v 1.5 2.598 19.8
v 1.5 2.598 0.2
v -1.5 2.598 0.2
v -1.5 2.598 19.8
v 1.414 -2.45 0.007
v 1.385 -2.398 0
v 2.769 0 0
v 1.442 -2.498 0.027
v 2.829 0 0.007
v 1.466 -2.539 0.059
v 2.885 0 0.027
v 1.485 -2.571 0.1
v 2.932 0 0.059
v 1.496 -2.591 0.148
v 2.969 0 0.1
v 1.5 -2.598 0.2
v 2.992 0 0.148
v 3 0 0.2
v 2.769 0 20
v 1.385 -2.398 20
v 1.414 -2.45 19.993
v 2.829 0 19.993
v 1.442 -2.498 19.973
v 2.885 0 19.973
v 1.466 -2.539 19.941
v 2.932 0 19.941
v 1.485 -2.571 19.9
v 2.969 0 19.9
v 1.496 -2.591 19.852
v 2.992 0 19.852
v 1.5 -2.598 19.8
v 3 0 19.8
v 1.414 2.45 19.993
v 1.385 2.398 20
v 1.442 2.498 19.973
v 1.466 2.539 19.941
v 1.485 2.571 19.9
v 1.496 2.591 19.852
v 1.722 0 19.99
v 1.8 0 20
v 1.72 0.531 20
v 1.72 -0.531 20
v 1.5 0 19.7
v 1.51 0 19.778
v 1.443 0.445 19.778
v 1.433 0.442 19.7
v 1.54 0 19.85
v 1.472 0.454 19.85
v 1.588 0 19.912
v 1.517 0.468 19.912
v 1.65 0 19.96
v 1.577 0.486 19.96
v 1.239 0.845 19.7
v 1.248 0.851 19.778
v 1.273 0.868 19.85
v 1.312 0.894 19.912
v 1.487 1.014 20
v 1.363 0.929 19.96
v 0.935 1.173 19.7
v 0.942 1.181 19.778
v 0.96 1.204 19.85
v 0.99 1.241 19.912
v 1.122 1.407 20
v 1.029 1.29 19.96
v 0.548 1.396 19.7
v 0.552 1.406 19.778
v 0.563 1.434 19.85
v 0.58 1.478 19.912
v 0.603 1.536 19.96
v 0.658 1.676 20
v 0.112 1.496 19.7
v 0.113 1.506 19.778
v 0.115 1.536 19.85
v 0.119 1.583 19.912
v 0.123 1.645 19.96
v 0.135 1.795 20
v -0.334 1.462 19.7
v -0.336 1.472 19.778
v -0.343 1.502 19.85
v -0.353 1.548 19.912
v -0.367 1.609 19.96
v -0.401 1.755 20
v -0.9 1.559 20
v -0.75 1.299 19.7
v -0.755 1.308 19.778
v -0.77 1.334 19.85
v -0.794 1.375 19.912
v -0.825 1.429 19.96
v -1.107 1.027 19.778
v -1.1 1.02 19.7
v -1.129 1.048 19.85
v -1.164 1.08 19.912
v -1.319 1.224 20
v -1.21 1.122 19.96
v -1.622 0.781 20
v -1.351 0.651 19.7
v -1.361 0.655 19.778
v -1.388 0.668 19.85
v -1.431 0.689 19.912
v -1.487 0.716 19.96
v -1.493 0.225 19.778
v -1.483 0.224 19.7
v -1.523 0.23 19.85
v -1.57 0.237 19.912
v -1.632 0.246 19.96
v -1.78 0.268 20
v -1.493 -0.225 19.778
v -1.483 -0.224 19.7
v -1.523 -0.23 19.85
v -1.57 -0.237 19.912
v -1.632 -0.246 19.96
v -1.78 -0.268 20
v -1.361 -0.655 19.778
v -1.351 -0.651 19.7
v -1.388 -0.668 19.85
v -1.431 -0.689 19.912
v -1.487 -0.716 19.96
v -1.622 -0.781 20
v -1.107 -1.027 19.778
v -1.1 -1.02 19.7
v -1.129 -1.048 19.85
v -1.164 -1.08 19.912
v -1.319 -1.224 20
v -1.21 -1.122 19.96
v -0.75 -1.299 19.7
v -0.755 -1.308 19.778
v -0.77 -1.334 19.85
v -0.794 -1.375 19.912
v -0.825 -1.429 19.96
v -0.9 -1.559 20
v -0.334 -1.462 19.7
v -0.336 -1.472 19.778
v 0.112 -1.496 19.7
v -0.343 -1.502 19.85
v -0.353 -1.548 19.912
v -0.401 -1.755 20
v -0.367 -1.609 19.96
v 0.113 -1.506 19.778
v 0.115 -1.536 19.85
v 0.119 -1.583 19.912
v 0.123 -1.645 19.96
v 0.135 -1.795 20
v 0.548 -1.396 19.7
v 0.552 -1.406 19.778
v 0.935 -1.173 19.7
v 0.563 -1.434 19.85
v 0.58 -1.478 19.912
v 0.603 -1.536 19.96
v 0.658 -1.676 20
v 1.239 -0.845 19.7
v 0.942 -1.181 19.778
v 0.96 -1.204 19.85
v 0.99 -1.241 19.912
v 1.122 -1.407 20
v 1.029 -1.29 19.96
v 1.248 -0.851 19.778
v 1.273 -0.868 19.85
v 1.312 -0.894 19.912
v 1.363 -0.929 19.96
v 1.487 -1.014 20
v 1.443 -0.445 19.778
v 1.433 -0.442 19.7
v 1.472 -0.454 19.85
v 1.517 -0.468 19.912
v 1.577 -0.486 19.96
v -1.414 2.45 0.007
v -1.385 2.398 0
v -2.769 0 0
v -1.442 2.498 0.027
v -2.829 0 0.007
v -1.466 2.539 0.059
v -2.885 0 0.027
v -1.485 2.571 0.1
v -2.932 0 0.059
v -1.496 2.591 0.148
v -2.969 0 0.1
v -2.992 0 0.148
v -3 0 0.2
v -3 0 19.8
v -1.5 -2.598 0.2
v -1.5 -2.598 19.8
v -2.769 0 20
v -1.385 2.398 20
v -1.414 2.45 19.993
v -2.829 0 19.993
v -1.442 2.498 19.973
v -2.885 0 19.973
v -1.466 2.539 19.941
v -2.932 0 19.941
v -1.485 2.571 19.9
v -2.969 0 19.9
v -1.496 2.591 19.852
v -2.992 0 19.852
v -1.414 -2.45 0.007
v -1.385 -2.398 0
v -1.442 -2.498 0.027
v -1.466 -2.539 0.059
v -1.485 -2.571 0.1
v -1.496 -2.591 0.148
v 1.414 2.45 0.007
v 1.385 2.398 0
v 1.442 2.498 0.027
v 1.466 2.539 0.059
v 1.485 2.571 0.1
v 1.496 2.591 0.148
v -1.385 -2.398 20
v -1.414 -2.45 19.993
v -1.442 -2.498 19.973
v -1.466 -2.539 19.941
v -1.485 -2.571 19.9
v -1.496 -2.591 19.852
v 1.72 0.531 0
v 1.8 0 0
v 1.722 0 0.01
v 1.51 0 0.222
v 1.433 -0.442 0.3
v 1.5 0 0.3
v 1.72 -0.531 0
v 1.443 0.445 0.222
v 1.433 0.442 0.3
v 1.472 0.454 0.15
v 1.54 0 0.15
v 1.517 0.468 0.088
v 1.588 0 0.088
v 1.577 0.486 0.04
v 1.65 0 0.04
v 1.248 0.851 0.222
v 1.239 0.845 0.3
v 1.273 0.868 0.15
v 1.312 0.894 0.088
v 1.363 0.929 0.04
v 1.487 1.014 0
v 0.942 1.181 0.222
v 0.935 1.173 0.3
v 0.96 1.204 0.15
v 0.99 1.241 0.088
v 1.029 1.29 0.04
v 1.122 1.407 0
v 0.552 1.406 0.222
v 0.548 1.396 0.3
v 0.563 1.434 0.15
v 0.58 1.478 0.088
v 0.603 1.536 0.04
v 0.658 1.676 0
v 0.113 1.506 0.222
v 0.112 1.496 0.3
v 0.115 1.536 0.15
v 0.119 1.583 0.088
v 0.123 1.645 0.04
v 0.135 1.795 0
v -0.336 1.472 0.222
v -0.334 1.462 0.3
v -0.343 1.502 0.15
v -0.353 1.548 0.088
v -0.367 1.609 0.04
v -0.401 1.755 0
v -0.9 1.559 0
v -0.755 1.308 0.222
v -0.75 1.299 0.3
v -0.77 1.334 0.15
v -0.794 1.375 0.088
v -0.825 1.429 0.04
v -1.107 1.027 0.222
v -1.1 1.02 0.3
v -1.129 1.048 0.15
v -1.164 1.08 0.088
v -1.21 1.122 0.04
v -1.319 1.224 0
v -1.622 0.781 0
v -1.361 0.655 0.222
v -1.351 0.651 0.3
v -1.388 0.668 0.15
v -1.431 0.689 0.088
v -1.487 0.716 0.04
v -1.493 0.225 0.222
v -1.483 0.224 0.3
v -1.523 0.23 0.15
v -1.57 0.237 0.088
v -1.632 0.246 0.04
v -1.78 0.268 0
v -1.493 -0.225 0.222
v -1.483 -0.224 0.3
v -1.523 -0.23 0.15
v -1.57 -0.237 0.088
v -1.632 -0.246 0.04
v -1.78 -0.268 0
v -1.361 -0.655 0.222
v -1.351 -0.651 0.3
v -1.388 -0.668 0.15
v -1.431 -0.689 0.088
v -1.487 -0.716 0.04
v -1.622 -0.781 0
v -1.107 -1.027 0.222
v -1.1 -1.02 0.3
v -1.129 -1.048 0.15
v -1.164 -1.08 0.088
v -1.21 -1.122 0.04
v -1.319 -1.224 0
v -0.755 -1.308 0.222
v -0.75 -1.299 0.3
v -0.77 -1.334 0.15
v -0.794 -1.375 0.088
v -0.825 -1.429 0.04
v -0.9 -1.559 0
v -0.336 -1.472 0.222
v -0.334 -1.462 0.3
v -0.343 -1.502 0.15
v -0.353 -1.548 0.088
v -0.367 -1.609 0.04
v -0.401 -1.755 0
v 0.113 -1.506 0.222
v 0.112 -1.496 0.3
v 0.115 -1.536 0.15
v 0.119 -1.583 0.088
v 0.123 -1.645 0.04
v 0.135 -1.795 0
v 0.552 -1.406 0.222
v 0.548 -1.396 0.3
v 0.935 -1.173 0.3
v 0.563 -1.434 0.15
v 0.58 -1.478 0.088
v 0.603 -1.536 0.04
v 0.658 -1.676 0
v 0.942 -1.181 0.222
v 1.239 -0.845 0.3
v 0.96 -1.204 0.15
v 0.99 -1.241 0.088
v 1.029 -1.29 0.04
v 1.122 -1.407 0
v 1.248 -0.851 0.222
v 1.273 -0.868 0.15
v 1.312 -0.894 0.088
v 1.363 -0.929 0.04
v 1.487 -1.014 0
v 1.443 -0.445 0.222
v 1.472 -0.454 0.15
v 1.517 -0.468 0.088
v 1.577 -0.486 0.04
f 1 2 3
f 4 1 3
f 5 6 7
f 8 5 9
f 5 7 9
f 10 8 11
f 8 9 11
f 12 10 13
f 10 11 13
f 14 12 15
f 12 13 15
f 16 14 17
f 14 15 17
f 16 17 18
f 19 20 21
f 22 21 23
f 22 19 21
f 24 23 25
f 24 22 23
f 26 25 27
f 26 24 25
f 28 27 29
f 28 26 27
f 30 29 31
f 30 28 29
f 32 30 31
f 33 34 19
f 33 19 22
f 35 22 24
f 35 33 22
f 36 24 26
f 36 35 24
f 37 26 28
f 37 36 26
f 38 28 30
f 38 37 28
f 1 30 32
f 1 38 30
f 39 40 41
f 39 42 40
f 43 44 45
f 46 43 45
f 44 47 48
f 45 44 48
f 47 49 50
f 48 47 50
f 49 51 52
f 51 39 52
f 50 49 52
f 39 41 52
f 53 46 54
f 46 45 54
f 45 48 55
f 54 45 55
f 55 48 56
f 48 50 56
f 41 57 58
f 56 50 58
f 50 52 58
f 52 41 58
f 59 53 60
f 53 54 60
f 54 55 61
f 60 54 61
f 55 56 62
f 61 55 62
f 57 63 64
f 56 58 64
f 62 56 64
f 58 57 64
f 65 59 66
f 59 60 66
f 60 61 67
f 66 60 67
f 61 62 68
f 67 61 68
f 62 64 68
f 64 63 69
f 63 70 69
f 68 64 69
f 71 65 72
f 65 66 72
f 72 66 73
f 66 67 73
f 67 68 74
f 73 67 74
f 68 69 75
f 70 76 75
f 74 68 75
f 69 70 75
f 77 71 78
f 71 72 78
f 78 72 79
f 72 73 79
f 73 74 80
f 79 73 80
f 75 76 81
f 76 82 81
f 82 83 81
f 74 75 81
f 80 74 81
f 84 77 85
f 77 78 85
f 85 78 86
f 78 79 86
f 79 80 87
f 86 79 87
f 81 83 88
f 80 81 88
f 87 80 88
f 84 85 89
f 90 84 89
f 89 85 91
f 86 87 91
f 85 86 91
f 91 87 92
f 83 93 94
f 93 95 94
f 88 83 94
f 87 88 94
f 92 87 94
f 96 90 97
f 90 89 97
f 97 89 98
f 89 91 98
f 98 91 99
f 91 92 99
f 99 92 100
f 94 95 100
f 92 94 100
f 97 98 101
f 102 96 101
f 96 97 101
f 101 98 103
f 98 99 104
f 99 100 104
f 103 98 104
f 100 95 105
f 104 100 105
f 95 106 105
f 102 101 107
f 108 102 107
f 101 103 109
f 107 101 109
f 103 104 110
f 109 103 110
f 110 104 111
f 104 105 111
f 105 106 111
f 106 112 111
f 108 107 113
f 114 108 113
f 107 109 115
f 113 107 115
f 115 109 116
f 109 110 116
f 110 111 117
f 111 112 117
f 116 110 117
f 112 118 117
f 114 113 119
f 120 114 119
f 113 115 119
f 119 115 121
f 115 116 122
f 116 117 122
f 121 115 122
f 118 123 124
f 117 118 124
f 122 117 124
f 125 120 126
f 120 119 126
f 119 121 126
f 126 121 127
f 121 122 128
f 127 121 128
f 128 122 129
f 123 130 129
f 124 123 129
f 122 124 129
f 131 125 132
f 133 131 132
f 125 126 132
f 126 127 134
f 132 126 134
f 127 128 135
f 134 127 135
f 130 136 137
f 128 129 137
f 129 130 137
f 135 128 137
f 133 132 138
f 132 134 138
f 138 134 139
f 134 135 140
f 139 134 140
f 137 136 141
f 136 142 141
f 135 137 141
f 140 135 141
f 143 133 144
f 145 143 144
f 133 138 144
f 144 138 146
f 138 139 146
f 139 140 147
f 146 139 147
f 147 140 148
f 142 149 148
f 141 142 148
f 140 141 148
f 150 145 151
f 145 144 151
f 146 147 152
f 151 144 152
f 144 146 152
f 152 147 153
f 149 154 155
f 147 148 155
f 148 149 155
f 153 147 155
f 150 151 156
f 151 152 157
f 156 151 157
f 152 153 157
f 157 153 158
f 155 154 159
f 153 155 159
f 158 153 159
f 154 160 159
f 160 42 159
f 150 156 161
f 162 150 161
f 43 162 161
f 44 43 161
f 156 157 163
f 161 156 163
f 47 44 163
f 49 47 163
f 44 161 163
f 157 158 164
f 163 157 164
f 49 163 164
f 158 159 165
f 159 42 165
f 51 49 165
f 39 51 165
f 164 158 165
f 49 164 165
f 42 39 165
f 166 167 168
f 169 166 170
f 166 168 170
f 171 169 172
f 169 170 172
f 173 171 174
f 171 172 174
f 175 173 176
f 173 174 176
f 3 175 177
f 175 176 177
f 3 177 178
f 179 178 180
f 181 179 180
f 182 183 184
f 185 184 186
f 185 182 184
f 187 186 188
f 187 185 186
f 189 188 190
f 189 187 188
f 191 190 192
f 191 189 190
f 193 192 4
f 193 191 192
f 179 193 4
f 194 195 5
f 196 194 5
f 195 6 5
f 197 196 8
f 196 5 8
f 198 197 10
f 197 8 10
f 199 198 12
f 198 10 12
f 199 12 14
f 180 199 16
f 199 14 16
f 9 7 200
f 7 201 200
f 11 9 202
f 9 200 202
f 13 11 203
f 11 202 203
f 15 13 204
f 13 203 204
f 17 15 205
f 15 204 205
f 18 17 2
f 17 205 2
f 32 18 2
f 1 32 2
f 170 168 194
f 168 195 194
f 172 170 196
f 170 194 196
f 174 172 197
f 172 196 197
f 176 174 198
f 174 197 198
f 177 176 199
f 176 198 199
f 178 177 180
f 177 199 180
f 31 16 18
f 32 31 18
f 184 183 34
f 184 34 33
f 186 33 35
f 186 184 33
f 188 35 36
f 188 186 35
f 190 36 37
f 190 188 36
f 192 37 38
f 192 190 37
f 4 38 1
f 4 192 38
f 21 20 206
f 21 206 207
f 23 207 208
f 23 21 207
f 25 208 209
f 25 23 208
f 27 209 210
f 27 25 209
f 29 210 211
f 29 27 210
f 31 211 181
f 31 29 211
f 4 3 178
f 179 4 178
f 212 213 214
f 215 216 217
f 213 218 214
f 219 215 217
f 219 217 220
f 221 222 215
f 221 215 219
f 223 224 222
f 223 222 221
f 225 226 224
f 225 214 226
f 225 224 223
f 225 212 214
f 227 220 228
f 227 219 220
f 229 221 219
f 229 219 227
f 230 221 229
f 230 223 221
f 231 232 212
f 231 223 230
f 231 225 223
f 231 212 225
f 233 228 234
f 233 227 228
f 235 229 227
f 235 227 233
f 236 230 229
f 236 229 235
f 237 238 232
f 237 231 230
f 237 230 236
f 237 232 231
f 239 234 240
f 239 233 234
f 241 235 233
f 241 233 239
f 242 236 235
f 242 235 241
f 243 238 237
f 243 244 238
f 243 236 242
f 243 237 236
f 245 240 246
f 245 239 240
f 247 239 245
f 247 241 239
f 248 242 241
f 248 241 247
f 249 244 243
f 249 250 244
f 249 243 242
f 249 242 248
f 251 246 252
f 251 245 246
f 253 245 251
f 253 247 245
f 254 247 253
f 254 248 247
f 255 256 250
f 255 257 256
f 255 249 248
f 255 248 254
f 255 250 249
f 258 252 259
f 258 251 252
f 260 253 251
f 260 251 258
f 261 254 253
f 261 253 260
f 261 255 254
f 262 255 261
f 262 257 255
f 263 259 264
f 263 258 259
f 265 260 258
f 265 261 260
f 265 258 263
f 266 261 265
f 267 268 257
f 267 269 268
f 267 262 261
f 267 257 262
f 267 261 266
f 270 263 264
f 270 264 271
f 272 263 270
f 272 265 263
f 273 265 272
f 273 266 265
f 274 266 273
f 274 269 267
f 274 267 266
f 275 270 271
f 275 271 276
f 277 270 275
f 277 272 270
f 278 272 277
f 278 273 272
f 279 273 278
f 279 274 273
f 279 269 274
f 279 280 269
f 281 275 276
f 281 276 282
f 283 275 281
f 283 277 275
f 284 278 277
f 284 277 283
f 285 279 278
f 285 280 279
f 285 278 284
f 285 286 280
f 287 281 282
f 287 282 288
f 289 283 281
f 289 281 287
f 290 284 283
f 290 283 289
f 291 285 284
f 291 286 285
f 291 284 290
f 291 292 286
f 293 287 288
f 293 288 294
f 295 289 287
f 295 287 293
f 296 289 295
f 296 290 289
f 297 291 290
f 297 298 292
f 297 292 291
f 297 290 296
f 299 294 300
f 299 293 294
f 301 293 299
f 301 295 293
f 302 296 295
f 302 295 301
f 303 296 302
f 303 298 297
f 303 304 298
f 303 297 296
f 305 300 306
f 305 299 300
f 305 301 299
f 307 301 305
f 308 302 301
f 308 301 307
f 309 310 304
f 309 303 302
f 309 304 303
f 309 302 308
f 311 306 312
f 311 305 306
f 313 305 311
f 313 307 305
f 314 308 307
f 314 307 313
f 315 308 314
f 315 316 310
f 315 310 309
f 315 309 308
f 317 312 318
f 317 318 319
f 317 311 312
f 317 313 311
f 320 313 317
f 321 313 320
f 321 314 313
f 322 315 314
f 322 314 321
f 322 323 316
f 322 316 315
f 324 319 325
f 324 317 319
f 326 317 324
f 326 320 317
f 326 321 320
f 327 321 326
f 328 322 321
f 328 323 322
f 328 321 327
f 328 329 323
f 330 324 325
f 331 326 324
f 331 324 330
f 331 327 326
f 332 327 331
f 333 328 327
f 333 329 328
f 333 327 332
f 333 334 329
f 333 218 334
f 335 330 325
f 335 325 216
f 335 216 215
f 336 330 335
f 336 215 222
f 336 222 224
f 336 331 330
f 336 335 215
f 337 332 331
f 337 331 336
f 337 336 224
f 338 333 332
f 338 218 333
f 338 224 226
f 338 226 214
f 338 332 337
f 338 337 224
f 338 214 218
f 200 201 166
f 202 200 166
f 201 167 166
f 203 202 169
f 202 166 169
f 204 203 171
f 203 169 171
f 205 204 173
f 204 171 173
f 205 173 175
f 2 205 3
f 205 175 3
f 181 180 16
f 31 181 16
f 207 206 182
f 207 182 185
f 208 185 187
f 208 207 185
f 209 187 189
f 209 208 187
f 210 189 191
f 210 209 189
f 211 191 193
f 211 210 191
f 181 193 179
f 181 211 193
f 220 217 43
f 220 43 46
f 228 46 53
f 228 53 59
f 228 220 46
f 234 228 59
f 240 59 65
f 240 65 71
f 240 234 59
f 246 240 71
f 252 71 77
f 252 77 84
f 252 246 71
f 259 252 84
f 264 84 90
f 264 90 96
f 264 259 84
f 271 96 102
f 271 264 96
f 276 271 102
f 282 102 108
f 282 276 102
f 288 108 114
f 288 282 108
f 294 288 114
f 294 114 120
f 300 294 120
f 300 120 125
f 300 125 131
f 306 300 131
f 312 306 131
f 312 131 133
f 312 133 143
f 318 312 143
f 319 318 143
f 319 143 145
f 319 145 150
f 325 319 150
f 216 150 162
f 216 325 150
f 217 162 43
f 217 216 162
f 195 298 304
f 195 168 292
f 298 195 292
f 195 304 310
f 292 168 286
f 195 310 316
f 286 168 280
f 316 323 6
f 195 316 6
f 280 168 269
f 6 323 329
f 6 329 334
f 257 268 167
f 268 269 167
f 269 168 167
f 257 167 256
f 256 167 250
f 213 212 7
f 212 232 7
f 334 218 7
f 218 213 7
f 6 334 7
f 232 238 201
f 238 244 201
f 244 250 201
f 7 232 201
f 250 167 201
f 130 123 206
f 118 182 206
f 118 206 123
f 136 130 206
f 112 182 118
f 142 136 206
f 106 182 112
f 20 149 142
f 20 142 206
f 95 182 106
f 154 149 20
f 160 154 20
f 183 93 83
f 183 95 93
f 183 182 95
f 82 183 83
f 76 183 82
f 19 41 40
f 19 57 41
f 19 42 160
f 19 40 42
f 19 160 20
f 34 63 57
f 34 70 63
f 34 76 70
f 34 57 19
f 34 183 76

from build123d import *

# Parameters (mm, degrees)
SKETCH1_R           = 1.5
BOSS_EXTRUDE1_DEPTH = 20
FILLET1_R           = 0.3
FILLET2_R           = 0.2


with BuildPart() as part:
    # Sketch1 → Boss-Extrude1 (new body)
    with BuildSketch(Plane.XY):
        Polygon((3, 0), (1.5, 2.598076211), (-1.5, 2.598076211), (-3, 0), (-1.5, -2.598076211), (1.5, -2.598076211), align=None)
        Circle(SKETCH1_R, mode=Mode.SUBTRACT)
    extrude(amount=BOSS_EXTRUDE1_DEPTH)

    # Fillet1
    fillet1_edges = [part.edges().sort_by_distance(p)[0] for p in [
        (-1.5, 0, 0),
        (-1.5, 0, 20),
    ]]
    fillet(fillet1_edges, radius=FILLET1_R)

    # Fillet2
    fillet2_edges = [part.edges().sort_by_distance(p)[0] for p in [
        (0, 2.598076211, 20),
        (-2.25, 1.299038106, 20),
        (-2.25, -1.299038106, 20),
        (0, -2.598076211, 20),
        (2.25, -1.299038106, 20),
        (0, -2.598076211, 0),
        (-2.25, -1.299038106, 0),
        (-2.25, 1.299038106, 0),
        (2.25, 1.299038106, 20),
        (0, 2.598076211, 0),
        (2.25, 1.299038106, 0),
        (2.25, -1.299038106, 0),
    ]]
    fillet(fillet2_edges, radius=FILLET2_R)


solid = part.part
